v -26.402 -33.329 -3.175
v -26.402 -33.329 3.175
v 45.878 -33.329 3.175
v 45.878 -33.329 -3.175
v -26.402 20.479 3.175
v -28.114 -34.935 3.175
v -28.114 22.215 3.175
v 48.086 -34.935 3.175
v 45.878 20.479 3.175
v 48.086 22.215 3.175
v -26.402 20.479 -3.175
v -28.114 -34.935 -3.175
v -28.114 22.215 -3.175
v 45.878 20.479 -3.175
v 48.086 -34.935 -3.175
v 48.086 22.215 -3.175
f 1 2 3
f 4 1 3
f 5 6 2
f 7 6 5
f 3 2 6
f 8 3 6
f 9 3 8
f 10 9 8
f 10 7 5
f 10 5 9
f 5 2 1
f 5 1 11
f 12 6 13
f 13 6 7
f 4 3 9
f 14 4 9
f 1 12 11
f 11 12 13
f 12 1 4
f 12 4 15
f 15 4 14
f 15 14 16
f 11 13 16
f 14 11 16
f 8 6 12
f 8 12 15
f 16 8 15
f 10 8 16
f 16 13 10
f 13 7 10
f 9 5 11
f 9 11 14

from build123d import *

# Parameters (mm, degrees)
F0_W     = 76.2
F0_H     = 57.15
F1_DEPTH = 3.175
F2_W     = 72.280051
F2_H     = 53.808485
F3_DEPTH = 6.35


with BuildPart() as f1:
    # F0 (on Top) → F1 (new body, symmetric)
    with BuildSketch(Plane.XY):
        with Locations((9.986312, -6.360359)):
            Rectangle(F0_W, F0_H)
    extrude(amount=F1_DEPTH, both=True)

    # F2 (on face) → F3 (cut, through all)
    with BuildSketch(Plane.XY.offset(3.175)):
        with Locations((9.73773, -6.424894)):
            Rectangle(F2_W, F2_H)
    extrude(amount=-F3_DEPTH, mode=Mode.SUBTRACT)


solid = f1.part
